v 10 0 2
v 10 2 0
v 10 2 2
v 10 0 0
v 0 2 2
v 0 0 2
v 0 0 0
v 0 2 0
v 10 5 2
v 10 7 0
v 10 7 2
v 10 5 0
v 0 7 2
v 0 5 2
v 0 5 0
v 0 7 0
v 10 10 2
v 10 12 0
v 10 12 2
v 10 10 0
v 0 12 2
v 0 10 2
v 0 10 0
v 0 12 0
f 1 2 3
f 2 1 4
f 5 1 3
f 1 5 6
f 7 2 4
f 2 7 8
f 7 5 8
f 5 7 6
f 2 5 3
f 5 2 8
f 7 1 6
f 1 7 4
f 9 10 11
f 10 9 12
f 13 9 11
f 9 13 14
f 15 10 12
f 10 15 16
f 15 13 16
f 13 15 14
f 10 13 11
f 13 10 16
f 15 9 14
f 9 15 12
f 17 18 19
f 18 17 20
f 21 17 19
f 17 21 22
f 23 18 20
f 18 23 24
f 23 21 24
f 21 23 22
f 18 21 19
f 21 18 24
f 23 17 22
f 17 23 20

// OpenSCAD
module bar(c) color(c) cube([10, 2, 2]);
bar("red");
translate([0, 5, 0]) bar("blue");
translate([0, 10, 0]) bar("green");
